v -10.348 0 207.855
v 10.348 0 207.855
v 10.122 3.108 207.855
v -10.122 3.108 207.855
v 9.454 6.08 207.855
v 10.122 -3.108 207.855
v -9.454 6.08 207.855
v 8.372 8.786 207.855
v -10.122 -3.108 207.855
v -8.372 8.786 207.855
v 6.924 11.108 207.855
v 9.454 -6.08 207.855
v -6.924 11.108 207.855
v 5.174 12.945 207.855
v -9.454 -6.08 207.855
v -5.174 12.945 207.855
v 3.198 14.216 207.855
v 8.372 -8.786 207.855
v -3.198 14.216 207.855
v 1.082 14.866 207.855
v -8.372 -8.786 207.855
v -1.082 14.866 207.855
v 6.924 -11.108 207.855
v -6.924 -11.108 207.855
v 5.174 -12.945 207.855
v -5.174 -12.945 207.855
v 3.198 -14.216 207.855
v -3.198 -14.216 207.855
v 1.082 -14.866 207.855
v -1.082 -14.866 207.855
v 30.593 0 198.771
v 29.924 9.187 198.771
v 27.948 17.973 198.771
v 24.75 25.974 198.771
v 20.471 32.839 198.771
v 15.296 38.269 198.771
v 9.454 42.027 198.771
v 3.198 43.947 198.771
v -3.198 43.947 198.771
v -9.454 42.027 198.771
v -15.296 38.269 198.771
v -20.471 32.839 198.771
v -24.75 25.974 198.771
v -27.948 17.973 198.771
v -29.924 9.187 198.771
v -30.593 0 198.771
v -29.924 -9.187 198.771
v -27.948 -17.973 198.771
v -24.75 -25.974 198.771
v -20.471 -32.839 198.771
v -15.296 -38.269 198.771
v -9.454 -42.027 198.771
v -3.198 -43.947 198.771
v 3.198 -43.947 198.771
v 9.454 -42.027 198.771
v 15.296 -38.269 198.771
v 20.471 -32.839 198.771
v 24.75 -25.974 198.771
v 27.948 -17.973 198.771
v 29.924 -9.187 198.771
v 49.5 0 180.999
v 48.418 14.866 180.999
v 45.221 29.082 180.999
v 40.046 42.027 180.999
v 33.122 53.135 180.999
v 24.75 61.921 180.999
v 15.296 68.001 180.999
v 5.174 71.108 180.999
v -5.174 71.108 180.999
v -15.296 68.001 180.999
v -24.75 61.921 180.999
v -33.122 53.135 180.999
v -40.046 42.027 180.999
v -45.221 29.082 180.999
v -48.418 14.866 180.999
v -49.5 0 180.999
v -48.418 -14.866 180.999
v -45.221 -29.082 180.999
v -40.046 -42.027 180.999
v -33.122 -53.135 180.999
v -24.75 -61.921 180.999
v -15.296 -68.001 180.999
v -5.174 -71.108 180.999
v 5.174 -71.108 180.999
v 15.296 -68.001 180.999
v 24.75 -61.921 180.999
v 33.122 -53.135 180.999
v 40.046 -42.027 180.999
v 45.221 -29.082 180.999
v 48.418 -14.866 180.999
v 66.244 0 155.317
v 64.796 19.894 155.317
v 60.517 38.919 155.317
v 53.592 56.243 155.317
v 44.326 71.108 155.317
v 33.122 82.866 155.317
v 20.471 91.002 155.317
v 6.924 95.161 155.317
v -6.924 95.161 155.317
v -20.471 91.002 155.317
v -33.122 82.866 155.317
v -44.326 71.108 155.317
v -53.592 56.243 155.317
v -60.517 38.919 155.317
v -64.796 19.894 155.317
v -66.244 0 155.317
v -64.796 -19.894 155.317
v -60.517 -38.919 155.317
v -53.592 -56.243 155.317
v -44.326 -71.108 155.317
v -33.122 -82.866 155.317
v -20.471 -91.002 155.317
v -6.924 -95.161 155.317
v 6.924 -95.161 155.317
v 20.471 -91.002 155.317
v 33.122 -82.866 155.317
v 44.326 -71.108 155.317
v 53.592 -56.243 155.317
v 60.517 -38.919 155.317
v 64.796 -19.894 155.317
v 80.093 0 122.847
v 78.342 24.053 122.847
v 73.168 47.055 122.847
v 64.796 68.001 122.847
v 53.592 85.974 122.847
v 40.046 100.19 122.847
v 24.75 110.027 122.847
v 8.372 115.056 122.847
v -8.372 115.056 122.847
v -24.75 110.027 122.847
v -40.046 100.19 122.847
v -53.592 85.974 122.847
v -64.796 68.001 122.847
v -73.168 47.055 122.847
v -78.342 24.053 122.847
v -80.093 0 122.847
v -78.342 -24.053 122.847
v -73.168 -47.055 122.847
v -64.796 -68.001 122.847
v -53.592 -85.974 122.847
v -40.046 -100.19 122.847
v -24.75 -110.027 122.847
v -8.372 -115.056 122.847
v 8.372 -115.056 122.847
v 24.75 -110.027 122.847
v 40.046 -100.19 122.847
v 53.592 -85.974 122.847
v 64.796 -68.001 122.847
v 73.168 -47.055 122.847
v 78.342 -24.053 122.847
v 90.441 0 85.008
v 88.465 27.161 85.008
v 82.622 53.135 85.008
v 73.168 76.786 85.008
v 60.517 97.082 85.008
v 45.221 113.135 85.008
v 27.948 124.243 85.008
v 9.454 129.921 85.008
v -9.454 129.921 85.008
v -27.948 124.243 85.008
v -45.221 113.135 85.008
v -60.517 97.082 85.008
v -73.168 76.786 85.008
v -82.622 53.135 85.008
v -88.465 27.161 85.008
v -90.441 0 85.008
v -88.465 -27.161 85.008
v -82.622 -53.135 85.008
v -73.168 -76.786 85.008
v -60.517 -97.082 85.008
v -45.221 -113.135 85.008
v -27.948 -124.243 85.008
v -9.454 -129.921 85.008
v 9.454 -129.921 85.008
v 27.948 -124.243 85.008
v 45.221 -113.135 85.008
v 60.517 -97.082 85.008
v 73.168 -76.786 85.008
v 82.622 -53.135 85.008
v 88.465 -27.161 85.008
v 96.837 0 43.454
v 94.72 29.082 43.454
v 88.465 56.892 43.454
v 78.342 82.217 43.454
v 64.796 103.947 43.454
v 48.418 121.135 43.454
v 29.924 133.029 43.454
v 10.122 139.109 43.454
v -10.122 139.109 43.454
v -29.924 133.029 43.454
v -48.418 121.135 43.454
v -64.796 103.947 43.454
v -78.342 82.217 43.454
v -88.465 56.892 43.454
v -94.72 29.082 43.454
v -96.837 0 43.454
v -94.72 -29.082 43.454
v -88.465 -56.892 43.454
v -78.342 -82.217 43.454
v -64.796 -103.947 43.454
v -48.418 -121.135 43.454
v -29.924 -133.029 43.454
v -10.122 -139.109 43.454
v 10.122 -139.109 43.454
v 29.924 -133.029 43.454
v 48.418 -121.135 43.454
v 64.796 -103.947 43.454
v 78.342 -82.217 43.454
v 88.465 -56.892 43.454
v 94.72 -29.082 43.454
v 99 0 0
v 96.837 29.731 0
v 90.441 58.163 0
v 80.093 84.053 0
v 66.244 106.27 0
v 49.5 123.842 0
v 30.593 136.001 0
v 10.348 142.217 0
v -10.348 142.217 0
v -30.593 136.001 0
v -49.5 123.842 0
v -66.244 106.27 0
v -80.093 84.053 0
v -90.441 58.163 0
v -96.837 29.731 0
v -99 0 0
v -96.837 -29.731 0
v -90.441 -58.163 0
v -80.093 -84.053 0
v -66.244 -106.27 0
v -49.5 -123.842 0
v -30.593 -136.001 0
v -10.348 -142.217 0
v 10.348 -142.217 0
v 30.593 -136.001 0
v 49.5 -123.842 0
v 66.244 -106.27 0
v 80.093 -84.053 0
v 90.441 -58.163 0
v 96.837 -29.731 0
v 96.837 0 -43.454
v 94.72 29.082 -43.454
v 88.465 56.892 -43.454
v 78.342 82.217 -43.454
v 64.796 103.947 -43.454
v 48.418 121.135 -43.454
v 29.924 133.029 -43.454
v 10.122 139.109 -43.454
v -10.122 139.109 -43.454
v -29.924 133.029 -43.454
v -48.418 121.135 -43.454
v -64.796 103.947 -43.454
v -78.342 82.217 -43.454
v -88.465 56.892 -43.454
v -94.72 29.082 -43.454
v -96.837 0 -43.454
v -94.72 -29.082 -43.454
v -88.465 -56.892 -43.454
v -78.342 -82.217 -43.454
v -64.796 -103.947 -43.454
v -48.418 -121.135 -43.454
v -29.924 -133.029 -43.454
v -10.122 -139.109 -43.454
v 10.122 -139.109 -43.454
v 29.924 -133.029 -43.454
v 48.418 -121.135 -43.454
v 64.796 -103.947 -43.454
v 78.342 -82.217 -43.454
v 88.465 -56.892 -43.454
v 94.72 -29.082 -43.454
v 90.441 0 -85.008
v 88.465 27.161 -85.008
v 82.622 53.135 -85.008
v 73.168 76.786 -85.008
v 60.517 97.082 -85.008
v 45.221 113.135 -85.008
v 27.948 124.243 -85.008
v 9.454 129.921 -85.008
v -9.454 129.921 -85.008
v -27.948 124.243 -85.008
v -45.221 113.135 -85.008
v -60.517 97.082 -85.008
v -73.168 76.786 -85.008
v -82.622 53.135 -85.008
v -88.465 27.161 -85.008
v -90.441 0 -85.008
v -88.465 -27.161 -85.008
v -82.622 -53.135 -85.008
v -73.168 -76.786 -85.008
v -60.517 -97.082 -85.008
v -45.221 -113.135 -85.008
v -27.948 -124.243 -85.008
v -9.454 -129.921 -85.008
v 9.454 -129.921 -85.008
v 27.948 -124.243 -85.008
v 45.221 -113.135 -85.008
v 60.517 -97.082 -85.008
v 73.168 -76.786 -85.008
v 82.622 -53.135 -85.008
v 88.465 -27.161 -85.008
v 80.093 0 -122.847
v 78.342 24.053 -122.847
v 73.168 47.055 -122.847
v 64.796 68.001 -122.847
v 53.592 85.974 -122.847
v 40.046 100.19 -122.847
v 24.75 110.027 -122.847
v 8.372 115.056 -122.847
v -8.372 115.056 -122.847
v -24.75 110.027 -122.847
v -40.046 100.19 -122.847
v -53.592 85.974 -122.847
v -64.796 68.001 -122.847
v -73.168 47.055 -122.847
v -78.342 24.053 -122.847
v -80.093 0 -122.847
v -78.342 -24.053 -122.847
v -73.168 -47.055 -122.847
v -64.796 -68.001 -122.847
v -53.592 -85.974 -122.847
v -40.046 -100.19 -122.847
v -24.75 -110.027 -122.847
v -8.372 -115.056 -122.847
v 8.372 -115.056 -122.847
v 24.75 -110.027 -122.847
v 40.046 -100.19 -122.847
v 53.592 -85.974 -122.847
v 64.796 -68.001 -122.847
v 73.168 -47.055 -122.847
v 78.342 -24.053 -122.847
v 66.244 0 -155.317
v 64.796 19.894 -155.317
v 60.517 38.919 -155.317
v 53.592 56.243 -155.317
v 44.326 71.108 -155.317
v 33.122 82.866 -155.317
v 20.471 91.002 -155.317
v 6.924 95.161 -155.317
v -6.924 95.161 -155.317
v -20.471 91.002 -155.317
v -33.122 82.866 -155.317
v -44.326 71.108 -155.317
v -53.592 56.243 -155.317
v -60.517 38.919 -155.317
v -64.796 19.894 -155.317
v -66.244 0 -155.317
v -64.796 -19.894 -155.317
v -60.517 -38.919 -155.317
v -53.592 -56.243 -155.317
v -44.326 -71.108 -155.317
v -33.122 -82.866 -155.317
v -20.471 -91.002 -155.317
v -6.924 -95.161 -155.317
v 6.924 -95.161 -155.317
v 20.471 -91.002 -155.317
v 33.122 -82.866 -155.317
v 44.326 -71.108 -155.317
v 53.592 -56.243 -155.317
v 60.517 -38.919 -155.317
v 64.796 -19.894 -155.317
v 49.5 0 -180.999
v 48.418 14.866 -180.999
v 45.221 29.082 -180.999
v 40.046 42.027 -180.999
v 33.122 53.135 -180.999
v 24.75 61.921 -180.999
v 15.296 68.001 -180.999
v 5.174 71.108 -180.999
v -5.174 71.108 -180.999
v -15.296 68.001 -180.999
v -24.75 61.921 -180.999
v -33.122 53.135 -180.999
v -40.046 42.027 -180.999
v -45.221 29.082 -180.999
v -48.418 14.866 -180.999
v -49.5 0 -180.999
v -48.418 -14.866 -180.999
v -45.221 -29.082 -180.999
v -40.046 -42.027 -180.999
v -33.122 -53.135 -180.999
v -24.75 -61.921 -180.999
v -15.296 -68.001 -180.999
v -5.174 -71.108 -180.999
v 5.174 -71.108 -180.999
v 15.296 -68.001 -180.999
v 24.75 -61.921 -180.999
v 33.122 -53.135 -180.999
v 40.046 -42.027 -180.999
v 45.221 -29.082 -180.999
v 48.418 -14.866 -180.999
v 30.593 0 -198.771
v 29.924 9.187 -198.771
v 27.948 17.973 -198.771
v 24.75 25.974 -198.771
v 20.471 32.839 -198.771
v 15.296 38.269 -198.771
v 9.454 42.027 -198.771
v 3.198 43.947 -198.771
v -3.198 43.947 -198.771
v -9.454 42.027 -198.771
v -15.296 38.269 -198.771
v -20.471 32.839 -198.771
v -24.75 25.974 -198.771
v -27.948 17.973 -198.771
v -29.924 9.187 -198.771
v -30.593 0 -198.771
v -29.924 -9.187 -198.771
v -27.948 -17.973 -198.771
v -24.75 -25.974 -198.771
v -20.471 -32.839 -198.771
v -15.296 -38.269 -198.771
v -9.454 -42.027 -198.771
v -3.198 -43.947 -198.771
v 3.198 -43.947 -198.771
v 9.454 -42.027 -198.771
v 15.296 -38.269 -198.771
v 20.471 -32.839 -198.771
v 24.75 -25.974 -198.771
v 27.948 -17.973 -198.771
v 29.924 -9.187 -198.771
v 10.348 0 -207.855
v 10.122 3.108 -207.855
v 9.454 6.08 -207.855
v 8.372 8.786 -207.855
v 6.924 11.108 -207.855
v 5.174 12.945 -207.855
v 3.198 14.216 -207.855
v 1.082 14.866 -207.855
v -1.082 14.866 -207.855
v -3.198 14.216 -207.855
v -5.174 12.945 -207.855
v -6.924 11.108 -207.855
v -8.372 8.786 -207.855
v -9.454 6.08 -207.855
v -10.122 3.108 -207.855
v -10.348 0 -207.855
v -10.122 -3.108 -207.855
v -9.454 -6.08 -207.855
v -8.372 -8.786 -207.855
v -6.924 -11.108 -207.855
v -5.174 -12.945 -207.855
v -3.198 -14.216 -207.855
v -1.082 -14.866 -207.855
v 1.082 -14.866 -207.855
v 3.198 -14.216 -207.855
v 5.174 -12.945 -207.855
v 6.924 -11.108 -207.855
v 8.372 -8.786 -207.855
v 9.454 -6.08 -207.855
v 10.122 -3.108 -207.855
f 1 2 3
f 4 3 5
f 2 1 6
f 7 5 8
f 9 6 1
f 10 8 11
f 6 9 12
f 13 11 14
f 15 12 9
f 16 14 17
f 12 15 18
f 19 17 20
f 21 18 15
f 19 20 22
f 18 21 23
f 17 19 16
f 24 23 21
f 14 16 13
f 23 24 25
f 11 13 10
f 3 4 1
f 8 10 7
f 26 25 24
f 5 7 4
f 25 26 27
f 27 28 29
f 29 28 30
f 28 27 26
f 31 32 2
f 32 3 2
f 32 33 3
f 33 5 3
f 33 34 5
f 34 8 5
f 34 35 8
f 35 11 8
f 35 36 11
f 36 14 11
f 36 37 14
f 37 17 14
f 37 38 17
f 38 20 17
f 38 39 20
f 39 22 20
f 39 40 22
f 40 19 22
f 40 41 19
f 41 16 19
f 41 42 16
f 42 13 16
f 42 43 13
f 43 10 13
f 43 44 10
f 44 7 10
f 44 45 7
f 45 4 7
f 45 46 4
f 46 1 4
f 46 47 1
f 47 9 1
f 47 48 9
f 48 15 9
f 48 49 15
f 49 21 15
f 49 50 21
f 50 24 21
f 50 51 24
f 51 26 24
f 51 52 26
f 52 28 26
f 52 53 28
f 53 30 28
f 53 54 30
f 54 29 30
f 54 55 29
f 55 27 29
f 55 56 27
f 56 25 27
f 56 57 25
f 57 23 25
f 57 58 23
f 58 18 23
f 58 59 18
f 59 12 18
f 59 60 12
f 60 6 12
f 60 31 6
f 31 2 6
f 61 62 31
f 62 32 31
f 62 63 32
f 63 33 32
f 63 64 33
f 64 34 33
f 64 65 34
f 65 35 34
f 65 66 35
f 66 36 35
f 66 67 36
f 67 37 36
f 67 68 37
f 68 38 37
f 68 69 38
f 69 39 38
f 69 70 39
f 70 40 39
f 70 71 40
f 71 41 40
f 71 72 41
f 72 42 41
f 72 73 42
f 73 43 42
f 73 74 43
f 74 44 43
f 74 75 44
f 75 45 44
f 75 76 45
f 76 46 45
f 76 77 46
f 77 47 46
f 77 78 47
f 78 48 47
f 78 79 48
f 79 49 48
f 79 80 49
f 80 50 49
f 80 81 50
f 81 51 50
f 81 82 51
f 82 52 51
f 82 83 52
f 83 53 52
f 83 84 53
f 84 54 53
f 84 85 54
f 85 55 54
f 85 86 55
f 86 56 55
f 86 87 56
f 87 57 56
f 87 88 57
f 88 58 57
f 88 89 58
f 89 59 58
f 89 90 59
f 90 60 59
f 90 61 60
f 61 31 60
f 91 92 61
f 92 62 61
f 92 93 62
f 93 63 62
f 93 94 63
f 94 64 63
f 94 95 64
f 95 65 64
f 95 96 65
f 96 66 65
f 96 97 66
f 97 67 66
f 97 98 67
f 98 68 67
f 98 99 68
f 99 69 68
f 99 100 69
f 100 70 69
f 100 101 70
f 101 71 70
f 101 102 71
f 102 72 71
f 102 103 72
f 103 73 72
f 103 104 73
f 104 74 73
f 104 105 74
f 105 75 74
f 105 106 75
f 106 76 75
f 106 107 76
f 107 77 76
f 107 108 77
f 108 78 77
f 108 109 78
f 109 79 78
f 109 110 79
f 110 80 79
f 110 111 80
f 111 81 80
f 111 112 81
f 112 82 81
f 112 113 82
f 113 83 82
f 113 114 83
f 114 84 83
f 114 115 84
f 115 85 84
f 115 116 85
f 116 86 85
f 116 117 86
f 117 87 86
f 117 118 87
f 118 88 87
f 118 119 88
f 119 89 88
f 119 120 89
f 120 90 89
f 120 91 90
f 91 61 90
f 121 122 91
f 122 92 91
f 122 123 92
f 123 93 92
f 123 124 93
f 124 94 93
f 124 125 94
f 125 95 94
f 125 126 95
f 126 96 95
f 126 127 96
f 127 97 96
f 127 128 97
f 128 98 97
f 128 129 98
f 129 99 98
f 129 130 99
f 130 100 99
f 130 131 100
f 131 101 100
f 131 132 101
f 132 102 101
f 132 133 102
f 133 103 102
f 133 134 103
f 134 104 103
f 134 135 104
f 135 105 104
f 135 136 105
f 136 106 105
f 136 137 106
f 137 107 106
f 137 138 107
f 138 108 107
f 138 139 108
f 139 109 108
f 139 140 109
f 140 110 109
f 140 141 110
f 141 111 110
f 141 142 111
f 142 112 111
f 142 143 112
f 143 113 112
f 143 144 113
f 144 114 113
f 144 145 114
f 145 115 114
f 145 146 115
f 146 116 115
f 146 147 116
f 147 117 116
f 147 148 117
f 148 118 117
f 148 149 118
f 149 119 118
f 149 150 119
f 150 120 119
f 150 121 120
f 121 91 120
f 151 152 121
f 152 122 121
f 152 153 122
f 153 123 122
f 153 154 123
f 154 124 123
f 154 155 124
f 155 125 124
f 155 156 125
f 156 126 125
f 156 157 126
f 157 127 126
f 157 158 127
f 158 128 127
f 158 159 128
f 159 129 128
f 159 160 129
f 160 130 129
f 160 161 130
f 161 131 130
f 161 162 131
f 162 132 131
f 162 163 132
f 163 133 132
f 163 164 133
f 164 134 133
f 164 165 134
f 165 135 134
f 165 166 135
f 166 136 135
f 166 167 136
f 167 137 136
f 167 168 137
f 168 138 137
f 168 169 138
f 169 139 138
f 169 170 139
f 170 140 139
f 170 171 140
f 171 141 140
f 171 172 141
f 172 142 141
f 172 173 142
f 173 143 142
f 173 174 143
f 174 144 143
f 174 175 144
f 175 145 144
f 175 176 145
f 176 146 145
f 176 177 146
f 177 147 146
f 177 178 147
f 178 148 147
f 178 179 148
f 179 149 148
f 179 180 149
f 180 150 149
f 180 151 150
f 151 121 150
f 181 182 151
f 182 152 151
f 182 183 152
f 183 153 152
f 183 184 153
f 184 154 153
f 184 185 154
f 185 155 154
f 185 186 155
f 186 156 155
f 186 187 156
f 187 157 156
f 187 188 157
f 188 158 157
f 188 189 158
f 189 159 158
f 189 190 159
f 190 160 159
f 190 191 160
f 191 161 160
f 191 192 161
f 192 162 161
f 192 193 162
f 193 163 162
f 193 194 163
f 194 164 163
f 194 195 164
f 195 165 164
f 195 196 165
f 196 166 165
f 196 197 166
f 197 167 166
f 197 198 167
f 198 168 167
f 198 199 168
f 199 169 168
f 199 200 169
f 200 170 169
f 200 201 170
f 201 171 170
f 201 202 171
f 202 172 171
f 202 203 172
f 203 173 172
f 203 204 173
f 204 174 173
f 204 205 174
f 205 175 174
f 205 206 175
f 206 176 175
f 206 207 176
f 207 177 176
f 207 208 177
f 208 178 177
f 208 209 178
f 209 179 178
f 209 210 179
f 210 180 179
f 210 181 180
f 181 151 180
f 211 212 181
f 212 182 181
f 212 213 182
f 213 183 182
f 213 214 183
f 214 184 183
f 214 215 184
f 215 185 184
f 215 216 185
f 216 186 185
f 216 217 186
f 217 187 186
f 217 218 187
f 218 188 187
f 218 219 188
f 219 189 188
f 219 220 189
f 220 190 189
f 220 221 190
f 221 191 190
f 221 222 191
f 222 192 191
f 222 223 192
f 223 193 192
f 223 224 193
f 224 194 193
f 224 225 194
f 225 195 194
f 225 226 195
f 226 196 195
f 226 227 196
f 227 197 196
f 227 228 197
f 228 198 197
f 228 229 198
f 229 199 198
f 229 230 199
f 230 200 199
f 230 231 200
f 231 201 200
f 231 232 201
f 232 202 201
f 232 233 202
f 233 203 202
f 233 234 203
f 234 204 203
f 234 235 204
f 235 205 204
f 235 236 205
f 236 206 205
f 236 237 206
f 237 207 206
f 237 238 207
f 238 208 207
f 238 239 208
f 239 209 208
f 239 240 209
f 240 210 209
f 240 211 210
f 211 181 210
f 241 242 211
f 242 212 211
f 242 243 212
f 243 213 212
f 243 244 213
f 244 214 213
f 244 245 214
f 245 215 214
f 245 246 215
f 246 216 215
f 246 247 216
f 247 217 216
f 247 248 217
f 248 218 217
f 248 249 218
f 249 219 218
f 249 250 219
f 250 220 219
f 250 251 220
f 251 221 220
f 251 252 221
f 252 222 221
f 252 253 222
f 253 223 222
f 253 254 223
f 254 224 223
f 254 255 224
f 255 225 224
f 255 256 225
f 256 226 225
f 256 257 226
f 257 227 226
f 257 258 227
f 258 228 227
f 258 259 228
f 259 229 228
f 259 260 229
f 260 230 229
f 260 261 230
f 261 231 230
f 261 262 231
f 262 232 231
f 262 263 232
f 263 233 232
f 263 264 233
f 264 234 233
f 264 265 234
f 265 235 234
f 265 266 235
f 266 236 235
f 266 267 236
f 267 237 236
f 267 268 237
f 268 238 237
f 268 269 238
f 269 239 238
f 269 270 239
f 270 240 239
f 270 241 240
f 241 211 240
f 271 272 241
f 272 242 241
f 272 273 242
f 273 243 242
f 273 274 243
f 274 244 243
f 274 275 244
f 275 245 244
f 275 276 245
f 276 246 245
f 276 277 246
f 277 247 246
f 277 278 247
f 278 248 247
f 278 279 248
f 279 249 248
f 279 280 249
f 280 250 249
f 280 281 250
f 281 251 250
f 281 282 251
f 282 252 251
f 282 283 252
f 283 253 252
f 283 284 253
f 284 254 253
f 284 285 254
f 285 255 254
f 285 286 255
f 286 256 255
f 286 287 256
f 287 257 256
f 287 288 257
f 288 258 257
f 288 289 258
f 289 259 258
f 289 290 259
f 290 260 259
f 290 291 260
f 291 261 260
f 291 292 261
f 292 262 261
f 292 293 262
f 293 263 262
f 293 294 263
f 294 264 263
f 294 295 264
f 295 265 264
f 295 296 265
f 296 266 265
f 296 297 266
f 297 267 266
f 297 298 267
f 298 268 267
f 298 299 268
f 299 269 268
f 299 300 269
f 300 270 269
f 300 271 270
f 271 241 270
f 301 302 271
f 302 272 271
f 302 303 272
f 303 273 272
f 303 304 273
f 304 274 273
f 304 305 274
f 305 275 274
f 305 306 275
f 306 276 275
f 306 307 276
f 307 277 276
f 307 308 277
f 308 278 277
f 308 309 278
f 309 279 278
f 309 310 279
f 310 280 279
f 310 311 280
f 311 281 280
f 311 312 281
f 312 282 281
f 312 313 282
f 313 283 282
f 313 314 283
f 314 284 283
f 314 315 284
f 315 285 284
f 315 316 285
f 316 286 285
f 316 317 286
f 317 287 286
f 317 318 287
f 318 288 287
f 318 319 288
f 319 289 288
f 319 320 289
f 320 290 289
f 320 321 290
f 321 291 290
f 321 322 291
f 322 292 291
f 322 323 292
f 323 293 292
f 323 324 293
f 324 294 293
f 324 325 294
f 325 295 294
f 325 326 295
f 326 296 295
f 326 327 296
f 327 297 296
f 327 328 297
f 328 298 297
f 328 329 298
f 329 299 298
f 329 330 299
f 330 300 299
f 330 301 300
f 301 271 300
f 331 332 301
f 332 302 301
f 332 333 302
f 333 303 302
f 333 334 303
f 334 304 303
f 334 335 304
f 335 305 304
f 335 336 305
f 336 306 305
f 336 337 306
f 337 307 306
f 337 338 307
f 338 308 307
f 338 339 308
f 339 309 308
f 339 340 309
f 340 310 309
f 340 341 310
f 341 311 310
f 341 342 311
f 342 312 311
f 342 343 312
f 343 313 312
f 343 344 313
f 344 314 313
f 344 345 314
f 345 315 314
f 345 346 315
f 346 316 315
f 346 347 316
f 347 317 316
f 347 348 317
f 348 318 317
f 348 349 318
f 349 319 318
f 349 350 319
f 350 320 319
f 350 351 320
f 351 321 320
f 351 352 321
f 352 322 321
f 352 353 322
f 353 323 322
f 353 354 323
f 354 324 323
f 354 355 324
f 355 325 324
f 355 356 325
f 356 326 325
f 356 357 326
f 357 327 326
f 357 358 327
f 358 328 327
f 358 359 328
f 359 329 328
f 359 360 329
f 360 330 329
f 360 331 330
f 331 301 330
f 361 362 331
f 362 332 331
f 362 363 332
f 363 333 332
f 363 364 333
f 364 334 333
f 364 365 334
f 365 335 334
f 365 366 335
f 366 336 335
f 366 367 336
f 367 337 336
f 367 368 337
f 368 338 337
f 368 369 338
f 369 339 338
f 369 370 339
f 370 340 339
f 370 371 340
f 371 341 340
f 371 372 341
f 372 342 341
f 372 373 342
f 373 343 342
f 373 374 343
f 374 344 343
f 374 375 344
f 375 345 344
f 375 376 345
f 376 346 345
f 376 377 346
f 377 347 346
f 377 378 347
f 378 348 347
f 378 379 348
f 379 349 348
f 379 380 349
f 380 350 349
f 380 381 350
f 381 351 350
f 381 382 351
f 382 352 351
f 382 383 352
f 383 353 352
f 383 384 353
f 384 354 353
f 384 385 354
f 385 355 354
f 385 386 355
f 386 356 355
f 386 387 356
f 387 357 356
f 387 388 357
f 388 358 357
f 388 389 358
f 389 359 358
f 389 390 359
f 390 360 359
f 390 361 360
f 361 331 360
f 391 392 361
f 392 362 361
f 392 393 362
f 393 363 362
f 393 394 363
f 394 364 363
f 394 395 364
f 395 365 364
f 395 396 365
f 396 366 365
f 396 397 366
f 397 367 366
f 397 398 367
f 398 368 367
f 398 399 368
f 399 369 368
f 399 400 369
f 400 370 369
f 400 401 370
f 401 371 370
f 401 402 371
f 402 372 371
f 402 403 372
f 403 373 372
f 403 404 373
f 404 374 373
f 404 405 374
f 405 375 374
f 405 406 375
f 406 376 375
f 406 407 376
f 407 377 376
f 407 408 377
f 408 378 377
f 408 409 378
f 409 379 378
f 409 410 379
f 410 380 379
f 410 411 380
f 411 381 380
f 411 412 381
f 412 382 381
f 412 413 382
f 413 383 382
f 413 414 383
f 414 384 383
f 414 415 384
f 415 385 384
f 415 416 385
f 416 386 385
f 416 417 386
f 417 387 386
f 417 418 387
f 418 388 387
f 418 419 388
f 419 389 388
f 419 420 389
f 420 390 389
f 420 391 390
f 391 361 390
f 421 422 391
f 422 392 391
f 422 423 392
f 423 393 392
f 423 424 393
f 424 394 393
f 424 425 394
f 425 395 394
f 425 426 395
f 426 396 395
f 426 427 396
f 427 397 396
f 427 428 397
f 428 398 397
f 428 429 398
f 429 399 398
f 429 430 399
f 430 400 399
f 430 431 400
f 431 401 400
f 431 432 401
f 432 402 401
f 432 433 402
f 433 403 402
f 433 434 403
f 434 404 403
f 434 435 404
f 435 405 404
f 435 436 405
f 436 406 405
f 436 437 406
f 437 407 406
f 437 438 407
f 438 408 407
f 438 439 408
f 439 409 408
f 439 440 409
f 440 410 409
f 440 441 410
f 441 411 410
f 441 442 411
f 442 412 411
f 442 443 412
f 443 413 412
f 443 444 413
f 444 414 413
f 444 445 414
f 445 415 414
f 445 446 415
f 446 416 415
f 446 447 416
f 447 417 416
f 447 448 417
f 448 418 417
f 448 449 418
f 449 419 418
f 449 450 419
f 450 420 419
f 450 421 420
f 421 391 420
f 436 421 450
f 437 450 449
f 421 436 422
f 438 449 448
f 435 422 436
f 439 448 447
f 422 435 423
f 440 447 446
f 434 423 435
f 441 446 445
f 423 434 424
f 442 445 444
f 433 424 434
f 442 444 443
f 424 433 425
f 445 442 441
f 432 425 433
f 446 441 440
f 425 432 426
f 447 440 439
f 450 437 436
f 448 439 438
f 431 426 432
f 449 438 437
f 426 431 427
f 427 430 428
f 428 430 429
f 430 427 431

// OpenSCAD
// Generated by SolidPython 1.0.1 on 2020-07-29 00:46:49


scale(v = [9, 13, 19]) {
	sphere(r = 11);
}
/***********************************************
*********      SolidPython code:      **********
************************************************
 
# import packages: SolidPython
from solid import *
from solid.utils import *
from itertools import chain, combinations, permutations


class Resize:

    def __init__(self, scad_file):
        self.scad_file = scad_file
        #self.scad_file = import_scad(scad_file)
        # cone/cylinder param:
        self.r1 = 0
        self.r2 = 0
        self.h = 0
        # rectangular prism param:
        self.w = 0
        self.l = 0
        # ellipse param:
        self.r = 0

    # import OpenScad code (file name corresponds to shape)


    # classify shape + parameters
    def assign(self, param1, param2, param3):
        if self.scad_file == 'cone.scad':
            self.r1 = param1
            self.r2 = param2
            self.h = param3
        elif self.scad_file == 'cylinder.scad':
            self.r1 = param1
            self.r2 = param2
            self.h = param3
        elif self.scad_file == 'rectangularPrism.scad':
            self.h = param1
            self.l = param2
            self.w = param3
        else:
            self.r = param1
            self.h = param2

    # resize parameters
    def iterate(self):
        x = range(3, 20, 2)
        i = 1
        if self.scad_file == 'cone.scad':
            tempList = list(permutations(x, 2))
            for temp in tempList:
                param1 = temp[0]
                param2 = temp[1]
                filepath = 'produced_scad_files/' + 'cone' + str(param1) + '_' + str(param2) + '_' + '.scad'
                scad_render_to_file(cylinder(h=param1, r1=param2, r2=0), filepath)

        elif self.scad_file == 'cylinder.scad':
            tempList = list(permutations(x, 3))
            for temp in tempList:
                param1 = temp[0]
                param2 = temp[1]
                filepath = 'produced_scad_files/' + 'cylinder' + str(param1) + '_' + str(param2) + '_' + '.scad'
                scad_render_to_file(cylinder(h=param1, r1=param2, r2=param2), filepath)

        elif self.scad_file == 'rectangularPrism.scad':
            tempList = list(permutations(x, 3))
            for temp in tempList:
                param1 = temp[0]
                param2 = temp[1]
                param3 = temp[2]
                filepath = 'produced_scad_files/' + 'rectangularPrism' + str(param1) + '_' + str(param2) + '_' + str(
                    param3) + '.scad'
                scad_render_to_file(cube(size=(param1, param2, param3)), filepath)

        elif self.scad_file == 'ellipse.scad':
            tempList = list(permutations(x, 4))
            for temp in tempList:
                param1 = temp[0]
                param2 = temp[1]
                param3 = temp[2]
                param4 = temp[3]
                filepath = 'produced_scad_files/' + 'ellipse' + str(param1) + '_' + str(param2) + '_' + str(param3) + '_' + str(param4) + '.scad'
                scad_render_to_file(scale([param1, param2, param3])(sphere(r=param4)), filepath)

    def render_to_scadfile(self):
        scad_render_to_file(scad, 'example.scad') 
 
************************************************/
